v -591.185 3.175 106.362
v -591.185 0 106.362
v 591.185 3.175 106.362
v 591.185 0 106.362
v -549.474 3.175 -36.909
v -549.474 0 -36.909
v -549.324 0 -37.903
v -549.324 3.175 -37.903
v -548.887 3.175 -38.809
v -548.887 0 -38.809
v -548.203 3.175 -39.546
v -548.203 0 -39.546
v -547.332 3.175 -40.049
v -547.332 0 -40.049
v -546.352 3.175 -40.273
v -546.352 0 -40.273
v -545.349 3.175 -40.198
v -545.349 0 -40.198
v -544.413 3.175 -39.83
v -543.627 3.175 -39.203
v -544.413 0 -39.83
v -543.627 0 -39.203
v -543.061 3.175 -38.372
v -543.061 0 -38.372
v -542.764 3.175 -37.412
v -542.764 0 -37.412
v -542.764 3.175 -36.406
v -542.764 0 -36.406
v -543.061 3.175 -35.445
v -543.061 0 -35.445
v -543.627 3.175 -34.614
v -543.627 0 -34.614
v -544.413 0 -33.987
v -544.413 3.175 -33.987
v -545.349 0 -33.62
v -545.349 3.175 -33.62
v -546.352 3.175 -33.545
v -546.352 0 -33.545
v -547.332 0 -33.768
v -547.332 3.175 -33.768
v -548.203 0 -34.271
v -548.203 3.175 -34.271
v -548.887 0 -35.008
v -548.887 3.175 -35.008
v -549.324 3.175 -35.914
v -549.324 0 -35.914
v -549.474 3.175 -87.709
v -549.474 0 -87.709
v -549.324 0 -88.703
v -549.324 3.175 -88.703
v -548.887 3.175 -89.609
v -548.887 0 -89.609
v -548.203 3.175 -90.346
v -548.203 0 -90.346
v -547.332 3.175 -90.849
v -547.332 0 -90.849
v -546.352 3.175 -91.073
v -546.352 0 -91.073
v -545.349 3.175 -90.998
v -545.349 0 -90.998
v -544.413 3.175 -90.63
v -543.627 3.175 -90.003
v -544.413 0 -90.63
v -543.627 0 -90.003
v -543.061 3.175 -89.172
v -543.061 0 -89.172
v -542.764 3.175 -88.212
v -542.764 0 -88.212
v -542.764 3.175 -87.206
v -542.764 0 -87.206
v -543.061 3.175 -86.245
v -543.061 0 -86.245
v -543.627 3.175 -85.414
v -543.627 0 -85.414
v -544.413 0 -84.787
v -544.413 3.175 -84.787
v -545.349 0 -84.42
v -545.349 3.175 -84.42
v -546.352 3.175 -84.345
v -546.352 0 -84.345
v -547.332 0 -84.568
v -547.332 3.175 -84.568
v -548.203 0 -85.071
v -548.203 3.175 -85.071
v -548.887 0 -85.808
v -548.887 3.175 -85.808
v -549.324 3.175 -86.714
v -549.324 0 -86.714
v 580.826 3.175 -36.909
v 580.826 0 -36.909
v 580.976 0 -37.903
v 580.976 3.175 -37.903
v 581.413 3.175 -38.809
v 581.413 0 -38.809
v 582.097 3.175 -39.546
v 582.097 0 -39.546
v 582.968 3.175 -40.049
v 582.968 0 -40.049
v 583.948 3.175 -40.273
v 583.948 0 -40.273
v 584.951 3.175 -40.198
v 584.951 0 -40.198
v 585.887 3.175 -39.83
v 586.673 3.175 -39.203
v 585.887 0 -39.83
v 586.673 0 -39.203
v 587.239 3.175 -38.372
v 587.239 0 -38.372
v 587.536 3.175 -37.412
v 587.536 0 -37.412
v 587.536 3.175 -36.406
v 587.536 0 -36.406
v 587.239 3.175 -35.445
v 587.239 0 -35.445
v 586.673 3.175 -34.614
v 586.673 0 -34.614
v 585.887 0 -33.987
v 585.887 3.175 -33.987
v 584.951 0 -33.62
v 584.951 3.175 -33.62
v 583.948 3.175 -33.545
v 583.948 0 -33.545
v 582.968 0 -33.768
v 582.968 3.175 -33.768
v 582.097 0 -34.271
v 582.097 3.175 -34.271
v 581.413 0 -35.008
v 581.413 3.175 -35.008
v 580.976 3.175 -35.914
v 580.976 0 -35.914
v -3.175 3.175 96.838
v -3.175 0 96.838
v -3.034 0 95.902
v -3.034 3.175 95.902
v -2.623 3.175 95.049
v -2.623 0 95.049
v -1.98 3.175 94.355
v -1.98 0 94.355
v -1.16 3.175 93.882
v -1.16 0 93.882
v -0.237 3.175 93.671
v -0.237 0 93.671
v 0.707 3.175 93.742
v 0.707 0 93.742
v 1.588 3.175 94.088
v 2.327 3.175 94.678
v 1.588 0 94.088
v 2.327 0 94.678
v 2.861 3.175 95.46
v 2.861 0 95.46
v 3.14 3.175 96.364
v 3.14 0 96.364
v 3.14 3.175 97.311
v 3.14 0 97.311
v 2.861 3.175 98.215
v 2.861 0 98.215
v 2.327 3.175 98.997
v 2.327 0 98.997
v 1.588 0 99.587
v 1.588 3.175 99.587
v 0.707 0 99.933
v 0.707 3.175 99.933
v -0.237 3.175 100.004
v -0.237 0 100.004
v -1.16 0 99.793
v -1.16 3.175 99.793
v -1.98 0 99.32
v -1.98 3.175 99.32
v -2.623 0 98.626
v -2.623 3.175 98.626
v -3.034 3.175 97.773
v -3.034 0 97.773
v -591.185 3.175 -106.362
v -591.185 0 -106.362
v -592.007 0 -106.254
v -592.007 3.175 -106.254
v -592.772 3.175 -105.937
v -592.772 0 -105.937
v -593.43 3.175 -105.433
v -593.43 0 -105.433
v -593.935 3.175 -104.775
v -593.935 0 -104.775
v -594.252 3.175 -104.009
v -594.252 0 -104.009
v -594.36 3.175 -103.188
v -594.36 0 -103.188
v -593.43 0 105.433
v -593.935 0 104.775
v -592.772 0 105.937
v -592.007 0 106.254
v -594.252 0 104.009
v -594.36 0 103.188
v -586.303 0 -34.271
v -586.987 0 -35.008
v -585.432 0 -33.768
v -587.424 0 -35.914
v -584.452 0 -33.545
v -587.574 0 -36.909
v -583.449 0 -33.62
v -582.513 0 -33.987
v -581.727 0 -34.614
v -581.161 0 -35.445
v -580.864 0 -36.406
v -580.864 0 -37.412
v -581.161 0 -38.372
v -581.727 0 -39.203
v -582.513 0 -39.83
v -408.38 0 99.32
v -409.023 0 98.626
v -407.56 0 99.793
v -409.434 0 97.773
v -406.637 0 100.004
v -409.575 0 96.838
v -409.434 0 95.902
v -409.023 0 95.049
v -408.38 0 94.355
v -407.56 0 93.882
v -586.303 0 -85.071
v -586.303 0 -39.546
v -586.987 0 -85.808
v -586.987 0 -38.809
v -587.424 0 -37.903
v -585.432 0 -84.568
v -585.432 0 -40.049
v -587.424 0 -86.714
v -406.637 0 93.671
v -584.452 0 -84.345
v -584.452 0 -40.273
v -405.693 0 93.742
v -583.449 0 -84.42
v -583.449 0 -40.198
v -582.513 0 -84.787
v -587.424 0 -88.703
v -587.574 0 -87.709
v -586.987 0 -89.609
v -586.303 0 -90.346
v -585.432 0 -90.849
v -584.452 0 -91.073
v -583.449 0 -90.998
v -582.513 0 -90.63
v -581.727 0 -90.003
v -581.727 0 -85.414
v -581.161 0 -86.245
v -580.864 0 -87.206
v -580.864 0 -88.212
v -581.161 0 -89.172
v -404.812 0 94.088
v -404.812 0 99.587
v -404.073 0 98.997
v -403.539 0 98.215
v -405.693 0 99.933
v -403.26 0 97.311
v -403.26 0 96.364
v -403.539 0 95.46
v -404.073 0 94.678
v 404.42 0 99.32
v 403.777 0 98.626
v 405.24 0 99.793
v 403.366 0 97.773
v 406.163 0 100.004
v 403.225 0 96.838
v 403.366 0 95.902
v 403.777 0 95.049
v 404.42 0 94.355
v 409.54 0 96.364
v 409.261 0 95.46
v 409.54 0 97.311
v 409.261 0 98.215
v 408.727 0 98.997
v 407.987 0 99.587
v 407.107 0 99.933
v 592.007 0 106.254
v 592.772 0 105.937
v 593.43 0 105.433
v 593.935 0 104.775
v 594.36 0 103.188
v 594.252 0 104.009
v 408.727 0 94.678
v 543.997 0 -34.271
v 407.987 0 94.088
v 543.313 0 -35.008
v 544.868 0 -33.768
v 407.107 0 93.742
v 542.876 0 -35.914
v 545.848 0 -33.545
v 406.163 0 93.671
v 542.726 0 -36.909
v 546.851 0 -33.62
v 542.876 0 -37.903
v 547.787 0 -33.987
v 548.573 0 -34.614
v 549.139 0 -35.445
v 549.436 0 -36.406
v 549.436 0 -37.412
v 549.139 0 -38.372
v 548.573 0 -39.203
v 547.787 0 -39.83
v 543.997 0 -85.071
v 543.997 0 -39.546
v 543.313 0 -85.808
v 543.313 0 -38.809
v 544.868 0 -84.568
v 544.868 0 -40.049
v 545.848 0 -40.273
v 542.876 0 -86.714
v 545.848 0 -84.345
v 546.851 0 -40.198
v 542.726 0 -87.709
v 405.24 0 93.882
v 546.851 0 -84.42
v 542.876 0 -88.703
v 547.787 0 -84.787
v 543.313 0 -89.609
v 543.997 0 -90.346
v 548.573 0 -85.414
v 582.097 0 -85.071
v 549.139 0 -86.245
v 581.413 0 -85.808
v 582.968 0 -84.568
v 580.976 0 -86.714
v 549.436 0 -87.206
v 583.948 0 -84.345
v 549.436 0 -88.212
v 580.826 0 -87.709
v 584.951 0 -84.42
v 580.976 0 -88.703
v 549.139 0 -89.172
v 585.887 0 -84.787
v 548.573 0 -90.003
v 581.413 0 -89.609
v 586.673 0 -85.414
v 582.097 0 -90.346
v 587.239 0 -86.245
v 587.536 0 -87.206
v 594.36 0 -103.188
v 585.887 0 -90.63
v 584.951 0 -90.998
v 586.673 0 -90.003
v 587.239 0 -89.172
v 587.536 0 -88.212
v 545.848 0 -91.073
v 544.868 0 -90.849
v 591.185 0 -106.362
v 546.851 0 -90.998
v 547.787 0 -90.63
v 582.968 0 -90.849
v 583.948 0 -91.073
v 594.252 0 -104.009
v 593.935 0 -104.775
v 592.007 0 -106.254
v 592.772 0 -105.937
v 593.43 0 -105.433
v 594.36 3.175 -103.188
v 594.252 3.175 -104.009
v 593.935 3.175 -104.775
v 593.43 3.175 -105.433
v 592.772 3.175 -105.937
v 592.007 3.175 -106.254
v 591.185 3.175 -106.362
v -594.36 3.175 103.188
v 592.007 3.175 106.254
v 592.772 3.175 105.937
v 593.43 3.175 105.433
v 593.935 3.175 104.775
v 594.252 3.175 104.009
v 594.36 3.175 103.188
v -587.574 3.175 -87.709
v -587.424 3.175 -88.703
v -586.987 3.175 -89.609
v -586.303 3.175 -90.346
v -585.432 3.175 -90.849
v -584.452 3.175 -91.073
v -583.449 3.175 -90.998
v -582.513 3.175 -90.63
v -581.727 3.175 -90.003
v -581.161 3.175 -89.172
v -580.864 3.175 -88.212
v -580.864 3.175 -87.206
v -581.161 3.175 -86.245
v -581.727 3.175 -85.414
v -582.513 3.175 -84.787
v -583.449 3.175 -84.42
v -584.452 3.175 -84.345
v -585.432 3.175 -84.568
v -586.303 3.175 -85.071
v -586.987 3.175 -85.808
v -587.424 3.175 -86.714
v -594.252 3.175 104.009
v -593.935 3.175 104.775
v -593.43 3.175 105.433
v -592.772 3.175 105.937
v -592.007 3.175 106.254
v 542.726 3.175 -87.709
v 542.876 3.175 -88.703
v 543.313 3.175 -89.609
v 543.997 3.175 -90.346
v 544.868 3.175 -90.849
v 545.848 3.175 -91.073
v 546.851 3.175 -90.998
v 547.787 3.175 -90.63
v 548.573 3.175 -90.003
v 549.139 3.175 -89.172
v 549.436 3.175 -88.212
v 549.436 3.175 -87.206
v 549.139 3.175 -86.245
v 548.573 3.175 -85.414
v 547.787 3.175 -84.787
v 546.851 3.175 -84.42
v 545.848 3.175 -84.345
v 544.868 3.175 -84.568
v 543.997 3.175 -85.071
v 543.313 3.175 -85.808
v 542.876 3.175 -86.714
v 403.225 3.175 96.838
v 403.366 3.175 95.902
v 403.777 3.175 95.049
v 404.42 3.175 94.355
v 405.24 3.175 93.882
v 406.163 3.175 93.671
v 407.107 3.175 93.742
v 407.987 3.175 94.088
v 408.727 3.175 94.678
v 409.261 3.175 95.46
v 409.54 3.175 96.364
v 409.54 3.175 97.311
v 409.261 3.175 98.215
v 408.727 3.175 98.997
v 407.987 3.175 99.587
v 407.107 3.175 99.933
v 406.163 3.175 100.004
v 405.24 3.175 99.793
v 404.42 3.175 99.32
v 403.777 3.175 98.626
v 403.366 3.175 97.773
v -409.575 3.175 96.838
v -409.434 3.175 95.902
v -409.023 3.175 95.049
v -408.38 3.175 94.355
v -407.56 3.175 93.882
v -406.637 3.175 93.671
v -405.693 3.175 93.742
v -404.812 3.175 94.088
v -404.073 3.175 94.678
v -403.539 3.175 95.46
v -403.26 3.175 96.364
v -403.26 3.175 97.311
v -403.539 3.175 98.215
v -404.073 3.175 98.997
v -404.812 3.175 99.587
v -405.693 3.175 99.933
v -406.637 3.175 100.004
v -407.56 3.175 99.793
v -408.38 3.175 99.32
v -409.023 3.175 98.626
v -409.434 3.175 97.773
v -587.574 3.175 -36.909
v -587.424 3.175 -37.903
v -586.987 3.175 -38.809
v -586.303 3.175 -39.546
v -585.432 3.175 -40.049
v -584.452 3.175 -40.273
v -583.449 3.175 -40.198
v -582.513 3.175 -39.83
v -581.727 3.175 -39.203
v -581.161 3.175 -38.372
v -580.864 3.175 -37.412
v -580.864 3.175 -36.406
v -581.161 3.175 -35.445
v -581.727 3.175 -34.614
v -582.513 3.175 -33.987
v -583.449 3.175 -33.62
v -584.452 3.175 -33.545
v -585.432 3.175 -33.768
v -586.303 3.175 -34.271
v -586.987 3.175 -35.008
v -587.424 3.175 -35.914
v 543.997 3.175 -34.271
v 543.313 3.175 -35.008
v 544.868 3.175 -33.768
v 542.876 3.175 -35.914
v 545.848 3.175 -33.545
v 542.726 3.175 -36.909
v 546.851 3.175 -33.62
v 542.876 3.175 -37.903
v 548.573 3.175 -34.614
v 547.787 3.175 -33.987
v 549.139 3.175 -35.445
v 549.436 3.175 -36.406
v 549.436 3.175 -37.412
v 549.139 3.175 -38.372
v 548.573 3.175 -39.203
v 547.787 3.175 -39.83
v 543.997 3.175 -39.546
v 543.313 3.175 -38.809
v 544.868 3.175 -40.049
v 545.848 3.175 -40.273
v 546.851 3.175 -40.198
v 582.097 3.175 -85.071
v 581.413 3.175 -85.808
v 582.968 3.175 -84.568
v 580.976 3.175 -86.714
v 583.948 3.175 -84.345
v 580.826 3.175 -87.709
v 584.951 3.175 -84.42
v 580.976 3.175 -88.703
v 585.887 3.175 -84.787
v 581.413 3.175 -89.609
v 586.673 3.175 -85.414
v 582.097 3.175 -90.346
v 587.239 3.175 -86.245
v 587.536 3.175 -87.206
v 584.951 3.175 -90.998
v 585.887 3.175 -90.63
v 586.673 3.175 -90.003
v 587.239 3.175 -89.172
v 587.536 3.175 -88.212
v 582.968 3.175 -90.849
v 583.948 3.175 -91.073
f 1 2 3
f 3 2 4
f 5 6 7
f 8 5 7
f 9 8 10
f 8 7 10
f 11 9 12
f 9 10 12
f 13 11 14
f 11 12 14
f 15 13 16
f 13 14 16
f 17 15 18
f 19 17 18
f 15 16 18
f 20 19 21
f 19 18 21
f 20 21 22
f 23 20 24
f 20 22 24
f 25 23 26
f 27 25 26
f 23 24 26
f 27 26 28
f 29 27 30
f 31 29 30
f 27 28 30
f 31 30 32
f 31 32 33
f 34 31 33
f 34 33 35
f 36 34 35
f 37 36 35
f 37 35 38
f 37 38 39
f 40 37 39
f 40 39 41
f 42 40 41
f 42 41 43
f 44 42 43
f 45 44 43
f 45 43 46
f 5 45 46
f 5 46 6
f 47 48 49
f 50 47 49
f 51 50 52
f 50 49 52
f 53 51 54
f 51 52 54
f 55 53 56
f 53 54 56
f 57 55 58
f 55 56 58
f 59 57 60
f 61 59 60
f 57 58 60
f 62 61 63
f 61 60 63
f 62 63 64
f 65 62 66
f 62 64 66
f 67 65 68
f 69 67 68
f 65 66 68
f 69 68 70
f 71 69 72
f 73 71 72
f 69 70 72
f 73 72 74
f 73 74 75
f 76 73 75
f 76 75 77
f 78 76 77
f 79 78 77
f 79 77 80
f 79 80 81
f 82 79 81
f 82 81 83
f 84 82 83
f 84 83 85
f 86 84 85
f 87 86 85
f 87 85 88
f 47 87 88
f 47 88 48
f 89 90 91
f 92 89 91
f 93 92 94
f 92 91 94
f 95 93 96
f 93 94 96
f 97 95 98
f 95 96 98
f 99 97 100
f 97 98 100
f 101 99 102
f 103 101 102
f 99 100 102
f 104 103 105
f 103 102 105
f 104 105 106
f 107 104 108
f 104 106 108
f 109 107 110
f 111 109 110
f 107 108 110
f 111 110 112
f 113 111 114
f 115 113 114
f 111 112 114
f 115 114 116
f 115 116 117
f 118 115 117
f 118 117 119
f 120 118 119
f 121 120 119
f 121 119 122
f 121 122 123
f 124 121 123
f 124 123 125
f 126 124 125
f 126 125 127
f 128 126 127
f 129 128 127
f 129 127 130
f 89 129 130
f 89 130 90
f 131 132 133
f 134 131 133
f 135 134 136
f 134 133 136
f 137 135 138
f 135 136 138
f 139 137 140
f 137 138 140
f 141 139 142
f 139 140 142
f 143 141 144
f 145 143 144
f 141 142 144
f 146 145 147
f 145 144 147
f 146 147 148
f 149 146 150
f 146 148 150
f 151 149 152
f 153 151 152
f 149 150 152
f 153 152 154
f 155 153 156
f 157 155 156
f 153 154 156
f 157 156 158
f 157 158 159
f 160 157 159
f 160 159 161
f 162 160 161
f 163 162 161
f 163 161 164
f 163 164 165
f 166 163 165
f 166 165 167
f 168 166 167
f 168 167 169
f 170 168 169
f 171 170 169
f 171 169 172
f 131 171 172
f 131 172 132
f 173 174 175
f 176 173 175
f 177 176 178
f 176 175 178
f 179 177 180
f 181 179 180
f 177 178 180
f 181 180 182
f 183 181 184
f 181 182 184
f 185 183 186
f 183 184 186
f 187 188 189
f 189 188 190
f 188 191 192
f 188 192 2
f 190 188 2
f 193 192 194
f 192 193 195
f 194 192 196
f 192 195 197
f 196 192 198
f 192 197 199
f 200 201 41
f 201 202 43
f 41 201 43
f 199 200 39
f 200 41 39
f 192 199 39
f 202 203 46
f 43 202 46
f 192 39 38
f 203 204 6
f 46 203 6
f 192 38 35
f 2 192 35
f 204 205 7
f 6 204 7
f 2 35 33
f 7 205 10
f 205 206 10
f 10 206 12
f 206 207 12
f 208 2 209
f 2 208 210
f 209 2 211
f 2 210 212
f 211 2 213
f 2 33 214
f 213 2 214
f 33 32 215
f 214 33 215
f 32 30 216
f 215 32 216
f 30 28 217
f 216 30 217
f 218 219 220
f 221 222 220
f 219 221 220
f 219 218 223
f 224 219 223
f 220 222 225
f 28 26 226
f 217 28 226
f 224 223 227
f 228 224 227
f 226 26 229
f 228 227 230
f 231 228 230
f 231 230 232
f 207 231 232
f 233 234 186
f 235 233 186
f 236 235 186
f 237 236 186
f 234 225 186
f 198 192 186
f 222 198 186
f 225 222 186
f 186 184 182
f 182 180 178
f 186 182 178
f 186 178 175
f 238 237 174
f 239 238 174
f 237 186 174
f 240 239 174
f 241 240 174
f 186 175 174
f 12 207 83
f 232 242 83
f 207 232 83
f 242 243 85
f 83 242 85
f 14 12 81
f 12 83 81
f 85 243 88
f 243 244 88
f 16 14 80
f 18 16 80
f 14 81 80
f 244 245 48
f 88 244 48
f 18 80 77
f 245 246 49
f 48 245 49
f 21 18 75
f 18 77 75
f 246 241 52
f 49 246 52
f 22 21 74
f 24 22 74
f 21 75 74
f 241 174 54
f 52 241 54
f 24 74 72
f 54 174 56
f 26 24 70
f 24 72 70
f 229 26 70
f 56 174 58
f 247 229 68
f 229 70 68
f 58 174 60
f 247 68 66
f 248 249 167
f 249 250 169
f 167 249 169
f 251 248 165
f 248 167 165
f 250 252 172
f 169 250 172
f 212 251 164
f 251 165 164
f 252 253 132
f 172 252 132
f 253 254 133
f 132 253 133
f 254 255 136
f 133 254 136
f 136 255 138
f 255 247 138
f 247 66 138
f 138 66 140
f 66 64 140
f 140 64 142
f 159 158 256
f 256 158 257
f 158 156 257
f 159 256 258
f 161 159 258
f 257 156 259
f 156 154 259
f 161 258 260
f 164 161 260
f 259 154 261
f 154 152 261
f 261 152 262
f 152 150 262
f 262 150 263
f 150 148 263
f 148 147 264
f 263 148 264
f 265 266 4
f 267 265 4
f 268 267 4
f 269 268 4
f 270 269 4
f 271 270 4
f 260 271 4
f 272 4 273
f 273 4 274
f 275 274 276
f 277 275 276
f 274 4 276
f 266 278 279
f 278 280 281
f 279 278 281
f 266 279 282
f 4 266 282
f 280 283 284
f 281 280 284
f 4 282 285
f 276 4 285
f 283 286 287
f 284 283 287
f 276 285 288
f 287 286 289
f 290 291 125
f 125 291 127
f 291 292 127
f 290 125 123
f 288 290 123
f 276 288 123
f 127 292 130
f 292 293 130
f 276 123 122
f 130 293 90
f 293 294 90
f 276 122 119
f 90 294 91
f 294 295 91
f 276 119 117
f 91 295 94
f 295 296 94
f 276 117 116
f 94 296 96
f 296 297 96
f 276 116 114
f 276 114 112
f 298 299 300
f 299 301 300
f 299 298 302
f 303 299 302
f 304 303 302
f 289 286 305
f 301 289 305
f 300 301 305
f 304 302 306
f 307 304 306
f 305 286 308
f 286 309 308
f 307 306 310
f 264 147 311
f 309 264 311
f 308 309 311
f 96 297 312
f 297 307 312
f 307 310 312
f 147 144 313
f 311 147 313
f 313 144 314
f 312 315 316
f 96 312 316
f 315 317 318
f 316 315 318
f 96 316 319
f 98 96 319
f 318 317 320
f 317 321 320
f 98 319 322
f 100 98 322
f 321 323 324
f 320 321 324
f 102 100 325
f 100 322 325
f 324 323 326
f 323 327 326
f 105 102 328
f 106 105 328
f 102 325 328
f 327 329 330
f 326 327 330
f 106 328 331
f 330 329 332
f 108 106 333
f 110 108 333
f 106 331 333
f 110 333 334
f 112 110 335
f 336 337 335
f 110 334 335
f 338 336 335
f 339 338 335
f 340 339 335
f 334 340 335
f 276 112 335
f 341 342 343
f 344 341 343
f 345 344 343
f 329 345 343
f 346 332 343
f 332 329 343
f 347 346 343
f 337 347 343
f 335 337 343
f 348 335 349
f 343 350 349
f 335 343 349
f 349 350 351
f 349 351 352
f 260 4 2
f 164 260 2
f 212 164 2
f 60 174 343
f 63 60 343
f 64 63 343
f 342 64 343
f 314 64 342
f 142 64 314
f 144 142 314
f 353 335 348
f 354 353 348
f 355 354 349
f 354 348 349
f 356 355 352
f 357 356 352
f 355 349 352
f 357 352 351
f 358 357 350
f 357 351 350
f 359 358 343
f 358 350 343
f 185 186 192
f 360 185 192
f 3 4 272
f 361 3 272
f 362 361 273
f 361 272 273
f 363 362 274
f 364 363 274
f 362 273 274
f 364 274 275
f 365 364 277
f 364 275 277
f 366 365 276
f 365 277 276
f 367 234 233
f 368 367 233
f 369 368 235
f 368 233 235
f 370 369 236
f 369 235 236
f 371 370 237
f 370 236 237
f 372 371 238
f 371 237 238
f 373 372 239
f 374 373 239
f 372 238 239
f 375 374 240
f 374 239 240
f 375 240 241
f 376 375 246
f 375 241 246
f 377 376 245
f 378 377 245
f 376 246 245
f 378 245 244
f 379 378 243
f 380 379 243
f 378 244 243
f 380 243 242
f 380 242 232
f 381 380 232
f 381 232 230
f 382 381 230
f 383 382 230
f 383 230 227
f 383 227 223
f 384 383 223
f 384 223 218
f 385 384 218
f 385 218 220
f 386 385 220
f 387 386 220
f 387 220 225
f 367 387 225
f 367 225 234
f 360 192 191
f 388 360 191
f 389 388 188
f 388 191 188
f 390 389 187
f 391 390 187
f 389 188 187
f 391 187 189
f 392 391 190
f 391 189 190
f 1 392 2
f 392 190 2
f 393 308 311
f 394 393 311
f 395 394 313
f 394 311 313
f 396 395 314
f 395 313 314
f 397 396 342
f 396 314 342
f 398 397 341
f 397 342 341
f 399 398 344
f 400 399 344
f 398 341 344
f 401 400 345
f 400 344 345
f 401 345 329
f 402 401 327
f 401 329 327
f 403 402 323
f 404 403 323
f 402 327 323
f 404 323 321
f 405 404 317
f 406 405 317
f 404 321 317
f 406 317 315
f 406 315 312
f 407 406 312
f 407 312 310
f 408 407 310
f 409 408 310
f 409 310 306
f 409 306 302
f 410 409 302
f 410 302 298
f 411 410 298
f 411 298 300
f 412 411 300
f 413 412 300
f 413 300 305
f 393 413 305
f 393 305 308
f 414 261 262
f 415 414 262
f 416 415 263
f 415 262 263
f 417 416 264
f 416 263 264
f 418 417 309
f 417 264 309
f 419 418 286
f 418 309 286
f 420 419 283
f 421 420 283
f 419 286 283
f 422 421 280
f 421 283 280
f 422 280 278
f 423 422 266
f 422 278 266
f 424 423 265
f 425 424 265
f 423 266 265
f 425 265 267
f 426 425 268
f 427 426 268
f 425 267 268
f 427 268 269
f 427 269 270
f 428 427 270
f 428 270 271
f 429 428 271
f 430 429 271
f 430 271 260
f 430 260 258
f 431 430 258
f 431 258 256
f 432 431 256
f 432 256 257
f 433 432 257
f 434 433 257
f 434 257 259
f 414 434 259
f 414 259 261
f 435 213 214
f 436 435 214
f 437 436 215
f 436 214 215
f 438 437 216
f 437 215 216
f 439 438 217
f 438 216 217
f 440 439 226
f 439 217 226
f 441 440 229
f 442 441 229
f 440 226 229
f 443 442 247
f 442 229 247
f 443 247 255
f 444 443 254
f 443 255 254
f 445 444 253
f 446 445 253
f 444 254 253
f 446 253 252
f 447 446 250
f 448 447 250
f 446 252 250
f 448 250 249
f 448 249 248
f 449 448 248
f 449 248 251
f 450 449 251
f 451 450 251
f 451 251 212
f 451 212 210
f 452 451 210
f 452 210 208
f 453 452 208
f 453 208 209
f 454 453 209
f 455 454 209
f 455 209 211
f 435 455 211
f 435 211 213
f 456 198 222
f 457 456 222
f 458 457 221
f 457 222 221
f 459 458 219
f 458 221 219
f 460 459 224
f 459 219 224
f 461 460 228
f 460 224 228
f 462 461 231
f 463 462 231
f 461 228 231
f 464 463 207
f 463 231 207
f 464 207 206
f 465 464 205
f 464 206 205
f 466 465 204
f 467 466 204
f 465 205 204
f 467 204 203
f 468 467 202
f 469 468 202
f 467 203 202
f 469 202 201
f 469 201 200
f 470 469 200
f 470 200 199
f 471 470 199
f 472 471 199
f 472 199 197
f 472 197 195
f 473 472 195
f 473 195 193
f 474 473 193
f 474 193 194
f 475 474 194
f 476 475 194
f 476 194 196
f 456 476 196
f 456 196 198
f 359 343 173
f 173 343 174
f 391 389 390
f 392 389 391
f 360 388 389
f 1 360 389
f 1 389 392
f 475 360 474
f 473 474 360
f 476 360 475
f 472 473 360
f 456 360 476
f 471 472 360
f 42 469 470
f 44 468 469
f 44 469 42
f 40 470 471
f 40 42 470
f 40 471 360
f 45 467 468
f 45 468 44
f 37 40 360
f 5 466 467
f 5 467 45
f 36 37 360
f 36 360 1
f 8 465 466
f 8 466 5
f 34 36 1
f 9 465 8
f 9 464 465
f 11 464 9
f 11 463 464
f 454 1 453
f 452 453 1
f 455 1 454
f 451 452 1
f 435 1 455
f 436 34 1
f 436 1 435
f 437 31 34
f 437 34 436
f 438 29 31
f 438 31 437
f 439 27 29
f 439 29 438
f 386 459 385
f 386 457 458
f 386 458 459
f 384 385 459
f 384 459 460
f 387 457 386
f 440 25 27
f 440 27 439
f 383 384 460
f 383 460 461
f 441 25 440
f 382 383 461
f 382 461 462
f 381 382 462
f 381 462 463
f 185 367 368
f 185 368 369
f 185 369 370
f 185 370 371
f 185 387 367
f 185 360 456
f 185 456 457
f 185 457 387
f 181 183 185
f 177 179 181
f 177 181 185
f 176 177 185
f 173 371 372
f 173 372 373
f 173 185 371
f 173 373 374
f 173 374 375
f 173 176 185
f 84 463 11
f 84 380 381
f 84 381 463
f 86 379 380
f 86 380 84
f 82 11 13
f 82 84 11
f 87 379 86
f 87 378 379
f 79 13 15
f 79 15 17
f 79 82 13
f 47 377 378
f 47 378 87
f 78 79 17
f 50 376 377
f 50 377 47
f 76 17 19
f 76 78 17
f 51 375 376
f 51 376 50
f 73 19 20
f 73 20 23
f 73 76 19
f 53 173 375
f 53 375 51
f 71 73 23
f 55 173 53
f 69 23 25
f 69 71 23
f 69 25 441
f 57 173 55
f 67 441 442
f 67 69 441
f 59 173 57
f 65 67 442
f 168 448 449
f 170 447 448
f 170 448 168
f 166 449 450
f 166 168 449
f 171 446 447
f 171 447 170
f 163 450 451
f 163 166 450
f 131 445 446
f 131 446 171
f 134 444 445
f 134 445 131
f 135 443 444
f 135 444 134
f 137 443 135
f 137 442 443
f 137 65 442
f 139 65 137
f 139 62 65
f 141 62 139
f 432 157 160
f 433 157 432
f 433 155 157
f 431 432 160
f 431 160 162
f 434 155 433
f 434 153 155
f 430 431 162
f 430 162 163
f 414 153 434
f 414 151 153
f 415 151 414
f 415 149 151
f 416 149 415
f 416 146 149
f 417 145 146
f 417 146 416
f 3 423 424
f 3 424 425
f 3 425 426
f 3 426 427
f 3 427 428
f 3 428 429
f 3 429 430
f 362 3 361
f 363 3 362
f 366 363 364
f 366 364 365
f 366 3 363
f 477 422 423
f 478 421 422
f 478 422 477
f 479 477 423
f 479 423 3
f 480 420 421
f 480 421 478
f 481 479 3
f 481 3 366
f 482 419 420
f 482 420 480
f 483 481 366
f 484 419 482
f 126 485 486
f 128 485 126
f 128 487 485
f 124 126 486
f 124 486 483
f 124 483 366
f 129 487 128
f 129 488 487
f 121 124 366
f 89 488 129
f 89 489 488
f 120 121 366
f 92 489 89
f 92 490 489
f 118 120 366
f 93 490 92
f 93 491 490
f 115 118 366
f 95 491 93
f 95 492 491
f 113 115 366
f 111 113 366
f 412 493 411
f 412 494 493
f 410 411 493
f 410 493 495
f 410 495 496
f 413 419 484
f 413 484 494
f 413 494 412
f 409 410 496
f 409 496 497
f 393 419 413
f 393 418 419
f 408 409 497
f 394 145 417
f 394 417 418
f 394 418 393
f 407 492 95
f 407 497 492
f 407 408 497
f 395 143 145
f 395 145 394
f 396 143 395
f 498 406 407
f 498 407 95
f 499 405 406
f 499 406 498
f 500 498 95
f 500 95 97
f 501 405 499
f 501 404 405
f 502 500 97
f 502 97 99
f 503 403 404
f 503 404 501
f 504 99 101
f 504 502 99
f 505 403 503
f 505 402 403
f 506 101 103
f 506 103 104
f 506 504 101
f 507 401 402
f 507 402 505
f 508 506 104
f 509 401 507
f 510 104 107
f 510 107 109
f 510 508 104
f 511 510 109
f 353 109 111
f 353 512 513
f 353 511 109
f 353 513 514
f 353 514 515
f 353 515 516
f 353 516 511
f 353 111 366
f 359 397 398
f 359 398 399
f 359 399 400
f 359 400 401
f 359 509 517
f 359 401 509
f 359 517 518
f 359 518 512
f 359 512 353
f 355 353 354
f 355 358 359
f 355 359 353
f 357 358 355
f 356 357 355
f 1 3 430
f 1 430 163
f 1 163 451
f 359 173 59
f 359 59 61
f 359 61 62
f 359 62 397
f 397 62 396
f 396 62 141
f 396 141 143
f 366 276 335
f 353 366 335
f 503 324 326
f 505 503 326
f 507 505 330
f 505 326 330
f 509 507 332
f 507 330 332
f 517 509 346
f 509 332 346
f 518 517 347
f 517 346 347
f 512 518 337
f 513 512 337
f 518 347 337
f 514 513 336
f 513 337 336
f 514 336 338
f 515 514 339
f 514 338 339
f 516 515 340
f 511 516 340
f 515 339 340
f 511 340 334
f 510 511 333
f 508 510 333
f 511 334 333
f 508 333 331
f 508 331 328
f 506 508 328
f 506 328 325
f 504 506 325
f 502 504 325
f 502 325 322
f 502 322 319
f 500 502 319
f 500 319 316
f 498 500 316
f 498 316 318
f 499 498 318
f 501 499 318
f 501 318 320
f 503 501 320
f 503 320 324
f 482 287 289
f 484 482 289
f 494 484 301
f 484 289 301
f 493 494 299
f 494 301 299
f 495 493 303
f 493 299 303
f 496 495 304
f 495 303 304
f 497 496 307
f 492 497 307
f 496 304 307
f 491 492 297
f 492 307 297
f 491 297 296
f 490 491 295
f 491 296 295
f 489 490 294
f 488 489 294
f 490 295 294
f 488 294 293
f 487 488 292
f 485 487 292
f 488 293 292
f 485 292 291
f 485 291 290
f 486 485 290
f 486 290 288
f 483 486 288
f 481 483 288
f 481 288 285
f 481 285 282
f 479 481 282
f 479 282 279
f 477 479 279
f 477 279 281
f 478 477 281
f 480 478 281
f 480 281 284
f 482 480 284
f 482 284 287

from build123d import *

# Parameters (mm, degrees)
BOSS_EXTRUDE1_DEPTH              = 3.175
F_1_4_0_25_DIAMETER_HOLE1_D      = 6.35
F_17_64_0_26563_DIAMETER_HOLE2_D = 6.747002


with BuildPart() as part:
    # Sketch1 → Boss-Extrude1 (new body)
    with BuildSketch(Plane(origin=(0, 0, 0), x_dir=(1, 0, 0), z_dir=(0, 1, 0))):
        with BuildLine():
            Line((-591.185, -106.3625), (591.185, -106.3625))
            ThreePointArc((591.185, -106.3625), (593.43006403, -105.43256403), (594.36, -103.1875))
            Line((594.36, -103.1875), (594.36, 103.1875))
            ThreePointArc((594.36, 103.1875), (593.43006403, 105.43256403), (591.185, 106.3625))
            Line((591.185, 106.3625), (-591.185, 106.3625))
            ThreePointArc((-591.185, 106.3625), (-593.43006403, 105.43256403), (-594.36, 103.1875))
            Line((-594.36, 103.1875), (-594.36, -103.1875))
            ThreePointArc((-594.36, -103.1875), (-593.43006403, -105.43256403), (-591.185, -106.3625))
        make_face()
    extrude(amount=BOSS_EXTRUDE1_DEPTH)

    # 1/4 (0.25) Diameter Hole1 (through all)
    with Locations(Plane(origin=(0, 3.175, 0), x_dir=(1, 0, 0), z_dir=(0, 1, 0))):
        with Locations((0, -96.8375), (-406.4, -96.8375), (406.4, -96.8375)):
            Hole(F_1_4_0_25_DIAMETER_HOLE1_D / 2)

    # 17/64 (0.26563) Diameter Hole2 (through all)
    with Locations(Plane(origin=(0, 3.175, 0), x_dir=(1, 0, 0), z_dir=(0, 1, 0))):
        with Locations((-546.1, 36.90874), (-546.1, 87.70874), (-584.2, 87.70874), (-584.2, 36.90874), (584.2, 36.90874), (546.1, 36.90874), (546.1, 87.70874), (584.2, 87.70874)):
            Hole(F_17_64_0_26563_DIAMETER_HOLE2_D / 2)


solid = part.part
